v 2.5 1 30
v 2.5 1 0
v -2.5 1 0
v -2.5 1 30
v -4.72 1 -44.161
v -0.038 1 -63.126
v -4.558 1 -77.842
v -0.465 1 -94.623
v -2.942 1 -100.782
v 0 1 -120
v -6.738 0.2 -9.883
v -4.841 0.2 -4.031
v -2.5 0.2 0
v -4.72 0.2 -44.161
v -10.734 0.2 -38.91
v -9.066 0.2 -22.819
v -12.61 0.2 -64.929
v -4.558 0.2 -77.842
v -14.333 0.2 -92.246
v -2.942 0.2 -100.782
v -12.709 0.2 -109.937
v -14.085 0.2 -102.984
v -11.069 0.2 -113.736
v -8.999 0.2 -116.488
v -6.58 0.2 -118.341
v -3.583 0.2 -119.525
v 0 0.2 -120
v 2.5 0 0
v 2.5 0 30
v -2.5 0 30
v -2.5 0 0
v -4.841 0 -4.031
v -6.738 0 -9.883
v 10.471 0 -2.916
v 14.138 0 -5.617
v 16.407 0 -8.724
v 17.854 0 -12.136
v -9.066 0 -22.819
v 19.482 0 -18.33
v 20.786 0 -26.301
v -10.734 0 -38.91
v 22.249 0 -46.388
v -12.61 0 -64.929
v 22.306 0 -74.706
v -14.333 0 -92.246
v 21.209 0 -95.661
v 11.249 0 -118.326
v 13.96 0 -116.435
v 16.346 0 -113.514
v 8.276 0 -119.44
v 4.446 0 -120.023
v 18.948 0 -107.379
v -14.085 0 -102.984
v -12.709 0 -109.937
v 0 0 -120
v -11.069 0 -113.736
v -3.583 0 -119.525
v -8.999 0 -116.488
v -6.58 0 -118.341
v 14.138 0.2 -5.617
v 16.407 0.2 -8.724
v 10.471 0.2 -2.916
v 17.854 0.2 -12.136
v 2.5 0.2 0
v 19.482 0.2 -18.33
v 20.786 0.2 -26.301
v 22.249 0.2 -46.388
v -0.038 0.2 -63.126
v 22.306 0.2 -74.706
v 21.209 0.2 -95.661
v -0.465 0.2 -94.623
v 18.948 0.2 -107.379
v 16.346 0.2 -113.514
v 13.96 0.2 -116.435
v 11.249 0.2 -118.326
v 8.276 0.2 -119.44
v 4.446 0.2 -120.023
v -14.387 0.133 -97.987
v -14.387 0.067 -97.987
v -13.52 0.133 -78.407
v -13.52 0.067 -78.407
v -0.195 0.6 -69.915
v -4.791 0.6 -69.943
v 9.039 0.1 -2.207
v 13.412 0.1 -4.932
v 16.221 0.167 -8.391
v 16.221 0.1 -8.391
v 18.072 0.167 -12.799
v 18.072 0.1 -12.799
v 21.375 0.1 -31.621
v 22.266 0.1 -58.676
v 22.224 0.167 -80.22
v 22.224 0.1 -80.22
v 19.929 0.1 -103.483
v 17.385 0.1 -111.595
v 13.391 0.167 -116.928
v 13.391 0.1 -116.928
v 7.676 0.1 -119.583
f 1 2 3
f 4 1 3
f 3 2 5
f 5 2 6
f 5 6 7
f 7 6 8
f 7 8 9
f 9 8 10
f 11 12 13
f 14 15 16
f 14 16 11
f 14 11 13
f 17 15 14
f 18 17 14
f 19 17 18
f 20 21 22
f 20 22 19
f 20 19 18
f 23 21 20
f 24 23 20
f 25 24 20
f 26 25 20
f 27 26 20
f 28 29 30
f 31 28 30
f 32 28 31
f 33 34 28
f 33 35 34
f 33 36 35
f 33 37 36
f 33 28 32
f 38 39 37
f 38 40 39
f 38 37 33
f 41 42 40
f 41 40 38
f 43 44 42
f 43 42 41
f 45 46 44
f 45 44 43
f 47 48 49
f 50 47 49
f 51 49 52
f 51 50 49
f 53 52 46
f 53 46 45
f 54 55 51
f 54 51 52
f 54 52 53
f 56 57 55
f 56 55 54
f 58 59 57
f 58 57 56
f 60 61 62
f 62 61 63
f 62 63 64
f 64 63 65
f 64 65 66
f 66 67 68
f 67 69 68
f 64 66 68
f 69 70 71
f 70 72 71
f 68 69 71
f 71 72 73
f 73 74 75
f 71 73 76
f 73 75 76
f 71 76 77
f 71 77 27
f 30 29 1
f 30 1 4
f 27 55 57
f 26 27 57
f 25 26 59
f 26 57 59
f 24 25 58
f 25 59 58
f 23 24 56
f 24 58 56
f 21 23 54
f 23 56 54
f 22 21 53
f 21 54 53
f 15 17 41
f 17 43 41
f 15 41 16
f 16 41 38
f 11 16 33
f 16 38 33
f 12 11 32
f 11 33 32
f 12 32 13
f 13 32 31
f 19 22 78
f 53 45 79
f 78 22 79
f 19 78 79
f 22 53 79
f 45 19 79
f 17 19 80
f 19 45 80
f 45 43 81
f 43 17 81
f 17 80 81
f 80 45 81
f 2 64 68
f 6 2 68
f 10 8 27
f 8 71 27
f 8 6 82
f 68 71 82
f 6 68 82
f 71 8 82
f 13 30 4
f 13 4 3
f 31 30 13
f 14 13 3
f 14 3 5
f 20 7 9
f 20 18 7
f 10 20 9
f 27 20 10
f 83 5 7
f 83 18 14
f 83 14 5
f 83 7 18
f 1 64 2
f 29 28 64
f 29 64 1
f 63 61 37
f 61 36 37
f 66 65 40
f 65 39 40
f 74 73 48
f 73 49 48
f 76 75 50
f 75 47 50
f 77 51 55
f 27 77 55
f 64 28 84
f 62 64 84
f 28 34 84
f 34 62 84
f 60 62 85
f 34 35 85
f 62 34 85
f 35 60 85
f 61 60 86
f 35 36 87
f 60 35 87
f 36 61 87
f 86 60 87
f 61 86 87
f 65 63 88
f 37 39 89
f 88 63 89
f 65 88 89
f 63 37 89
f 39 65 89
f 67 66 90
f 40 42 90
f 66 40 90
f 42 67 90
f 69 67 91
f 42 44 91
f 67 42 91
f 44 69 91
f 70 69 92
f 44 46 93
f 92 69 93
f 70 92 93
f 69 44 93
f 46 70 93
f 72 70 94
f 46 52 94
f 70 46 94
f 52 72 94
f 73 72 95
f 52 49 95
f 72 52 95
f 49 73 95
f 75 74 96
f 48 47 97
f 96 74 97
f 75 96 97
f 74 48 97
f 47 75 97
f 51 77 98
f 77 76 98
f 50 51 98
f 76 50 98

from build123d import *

# Parameters (mm, degrees)
BOSS_EXTRUDE1_DEPTH = 1
BOSS_EXTRUDE2_DEPTH = 0.2


with BuildPart() as part:
    # Sketch2 → Boss-Extrude1 (new body)
    with BuildSketch(Plane(origin=(0, 0, 0), x_dir=(1, 0, 0), z_dir=(0, 1, 0))):
        with BuildLine():
            add(Edge.make_bspline(
                [(-2.5, 0), (-8.331510312, 79.88522278), (0, 120)],
                knots=[0, 0, 0, 1, 1, 1], degree=2))
            Line((-2.5, 0), (-2.5, -30))
            Line((-2.5, -30), (2.5, -30))
            Line((2.5, -30), (2.5, 0))
            add(Edge.make_bspline(
                [(2.5, 0), (-1.639184348, 79.830180153), (0, 120)],
                knots=[0, 0, 0, 1, 1, 1], degree=2))
        make_face()
    extrude(amount=BOSS_EXTRUDE1_DEPTH)

    # Sketch2<4> → Boss-Extrude2 (add)
    with BuildSketch(Plane(origin=(0, 0, 0), x_dir=(1, 0, 0), z_dir=(0, 1, 0))):
        with BuildLine():
            add(Edge.make_bspline(
                [(0, 120), (-7.357536045, 119.756200735), (-16.129085045, 114.539529428), (-10.960373375, 43.623400867), (-9.557728223, 8.38325723), (-2.5, 0)],
                knots=[0, 0, 0, 0, 0.313531983, 0.413531983, 1, 1, 1, 1], degree=3))
            add(Edge.make_bspline(
                [(-2.5, 0), (-8.331510312, 79.88522278), (0, 120)],
                knots=[0, 0, 0, 1, 1, 1], degree=2))
        make_face()
        with BuildLine():
            add(Edge.make_bspline(
                [(2.5, 0), (12.93217727, 2.692777353), (20.627994331, 11.539628461), (22.537131076, 45.079701294), (22.031174233, 66.371038208), (23.143387213, 92.940026456), (16.08225383, 117.629559659), (8.942412889, 120.567138422), (0, 120)],
                knots=[0, 0, 0, 0, 0.15609962, 0.39468135, 0.460940872, 0.752435315, 0.809984908, 1, 1, 1, 1], degree=3))
            add(Edge.make_bspline(
                [(2.5, 0), (-1.639184348, 79.830180153), (0, 120)],
                knots=[0, 0, 0, 1, 1, 1], degree=2))
        make_face()
    extrude(amount=BOSS_EXTRUDE2_DEPTH)


solid = part.part
